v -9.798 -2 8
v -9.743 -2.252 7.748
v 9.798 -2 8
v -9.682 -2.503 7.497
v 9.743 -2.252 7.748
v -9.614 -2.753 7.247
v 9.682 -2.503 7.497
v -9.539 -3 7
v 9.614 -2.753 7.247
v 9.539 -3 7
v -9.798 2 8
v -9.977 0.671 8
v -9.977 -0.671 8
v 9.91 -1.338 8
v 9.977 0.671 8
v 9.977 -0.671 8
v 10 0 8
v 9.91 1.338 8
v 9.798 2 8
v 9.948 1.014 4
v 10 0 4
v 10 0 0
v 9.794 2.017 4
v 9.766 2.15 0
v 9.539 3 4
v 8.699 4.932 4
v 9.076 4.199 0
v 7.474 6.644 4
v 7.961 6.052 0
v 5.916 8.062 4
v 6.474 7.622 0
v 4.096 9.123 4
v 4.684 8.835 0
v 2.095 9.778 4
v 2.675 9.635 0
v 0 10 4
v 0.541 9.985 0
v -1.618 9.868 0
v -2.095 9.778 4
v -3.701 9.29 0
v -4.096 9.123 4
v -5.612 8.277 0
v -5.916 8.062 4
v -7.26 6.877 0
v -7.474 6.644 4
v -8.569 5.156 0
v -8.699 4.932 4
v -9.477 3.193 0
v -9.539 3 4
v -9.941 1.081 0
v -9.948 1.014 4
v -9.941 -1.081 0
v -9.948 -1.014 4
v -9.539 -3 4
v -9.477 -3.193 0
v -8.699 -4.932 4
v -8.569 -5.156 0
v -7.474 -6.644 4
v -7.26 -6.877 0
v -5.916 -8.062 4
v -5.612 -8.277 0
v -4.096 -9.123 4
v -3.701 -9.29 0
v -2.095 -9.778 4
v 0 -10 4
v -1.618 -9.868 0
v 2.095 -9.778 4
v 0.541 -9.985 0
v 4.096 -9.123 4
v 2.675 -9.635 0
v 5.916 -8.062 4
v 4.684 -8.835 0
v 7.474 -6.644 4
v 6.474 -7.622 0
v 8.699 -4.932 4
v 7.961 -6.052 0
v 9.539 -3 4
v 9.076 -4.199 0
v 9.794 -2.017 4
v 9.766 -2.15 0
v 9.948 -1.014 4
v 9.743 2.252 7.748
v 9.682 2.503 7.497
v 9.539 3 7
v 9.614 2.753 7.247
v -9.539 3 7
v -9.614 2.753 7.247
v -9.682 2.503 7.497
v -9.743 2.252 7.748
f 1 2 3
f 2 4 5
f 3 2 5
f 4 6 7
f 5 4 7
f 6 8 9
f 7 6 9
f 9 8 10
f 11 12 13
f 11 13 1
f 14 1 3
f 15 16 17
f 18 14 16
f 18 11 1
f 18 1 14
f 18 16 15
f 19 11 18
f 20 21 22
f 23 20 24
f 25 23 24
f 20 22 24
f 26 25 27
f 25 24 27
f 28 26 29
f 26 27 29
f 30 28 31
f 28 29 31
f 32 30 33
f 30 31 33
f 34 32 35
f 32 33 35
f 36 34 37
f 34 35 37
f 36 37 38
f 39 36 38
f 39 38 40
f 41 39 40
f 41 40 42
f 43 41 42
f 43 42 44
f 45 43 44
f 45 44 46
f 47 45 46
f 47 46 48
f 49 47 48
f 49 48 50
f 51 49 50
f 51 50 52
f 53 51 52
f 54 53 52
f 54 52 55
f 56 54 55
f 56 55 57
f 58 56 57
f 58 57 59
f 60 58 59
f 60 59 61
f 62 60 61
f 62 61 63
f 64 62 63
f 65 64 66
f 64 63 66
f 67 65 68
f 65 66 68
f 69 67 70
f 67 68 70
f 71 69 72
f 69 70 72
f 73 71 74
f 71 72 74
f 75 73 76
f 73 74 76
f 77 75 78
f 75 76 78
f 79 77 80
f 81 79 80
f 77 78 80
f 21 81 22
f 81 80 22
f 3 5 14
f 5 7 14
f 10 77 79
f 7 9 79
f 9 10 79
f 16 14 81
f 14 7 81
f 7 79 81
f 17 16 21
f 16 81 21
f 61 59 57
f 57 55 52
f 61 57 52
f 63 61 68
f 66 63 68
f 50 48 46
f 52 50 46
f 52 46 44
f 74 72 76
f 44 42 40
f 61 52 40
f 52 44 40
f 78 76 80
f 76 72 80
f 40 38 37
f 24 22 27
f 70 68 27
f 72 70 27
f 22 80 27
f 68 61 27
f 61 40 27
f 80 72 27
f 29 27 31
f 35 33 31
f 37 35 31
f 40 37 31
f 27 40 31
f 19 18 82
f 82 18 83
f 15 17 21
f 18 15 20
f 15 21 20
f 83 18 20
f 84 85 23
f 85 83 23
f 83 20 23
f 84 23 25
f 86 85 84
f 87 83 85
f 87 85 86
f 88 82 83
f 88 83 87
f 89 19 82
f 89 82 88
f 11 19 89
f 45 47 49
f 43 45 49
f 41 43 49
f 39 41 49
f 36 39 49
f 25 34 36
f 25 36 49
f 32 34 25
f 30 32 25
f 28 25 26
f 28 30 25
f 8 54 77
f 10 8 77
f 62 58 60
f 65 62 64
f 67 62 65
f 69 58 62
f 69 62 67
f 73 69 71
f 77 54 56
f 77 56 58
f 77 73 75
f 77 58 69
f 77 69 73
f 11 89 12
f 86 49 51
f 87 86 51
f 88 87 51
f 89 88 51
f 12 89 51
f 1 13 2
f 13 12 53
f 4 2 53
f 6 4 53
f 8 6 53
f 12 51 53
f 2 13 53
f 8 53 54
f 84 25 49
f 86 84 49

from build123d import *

# Parameters (mm, degrees)
F0_R     = 10
F1_DEPTH = 4
F3_DEPTH = 4
F4_SIZE  = 1


with BuildPart() as f1:
    # F0 (on Top) → F1 (new body)
    with BuildSketch(Plane.XY):
        Circle(F0_R)
    extrude(amount=F1_DEPTH)

    # F2 (on face) → F3 (join)
    with BuildSketch(Plane.XY.offset(4)):
        with BuildLine():
            Line((9.539392, 3), (-9.539392, 3))
            ThreePointArc((-9.539392, 3), (-10, 0), (-9.539392, -3))
            Line((-9.539392, -3), (9.539392, -3))
            ThreePointArc((9.539392, -3), (9.884177, -1.517577), (10, 0))
            ThreePointArc((10, 0), (9.884177, 1.517577), (9.539392, 3))
        make_face()
    extrude(amount=F3_DEPTH)

    # F4
    f4_edges = [f1.edges().sort_by_distance(p)[0] for p in [
        (0, -3, 8),
        (0, 3, 8),
    ]]
    chamfer(f4_edges, length=F4_SIZE)


solid = f1.part
